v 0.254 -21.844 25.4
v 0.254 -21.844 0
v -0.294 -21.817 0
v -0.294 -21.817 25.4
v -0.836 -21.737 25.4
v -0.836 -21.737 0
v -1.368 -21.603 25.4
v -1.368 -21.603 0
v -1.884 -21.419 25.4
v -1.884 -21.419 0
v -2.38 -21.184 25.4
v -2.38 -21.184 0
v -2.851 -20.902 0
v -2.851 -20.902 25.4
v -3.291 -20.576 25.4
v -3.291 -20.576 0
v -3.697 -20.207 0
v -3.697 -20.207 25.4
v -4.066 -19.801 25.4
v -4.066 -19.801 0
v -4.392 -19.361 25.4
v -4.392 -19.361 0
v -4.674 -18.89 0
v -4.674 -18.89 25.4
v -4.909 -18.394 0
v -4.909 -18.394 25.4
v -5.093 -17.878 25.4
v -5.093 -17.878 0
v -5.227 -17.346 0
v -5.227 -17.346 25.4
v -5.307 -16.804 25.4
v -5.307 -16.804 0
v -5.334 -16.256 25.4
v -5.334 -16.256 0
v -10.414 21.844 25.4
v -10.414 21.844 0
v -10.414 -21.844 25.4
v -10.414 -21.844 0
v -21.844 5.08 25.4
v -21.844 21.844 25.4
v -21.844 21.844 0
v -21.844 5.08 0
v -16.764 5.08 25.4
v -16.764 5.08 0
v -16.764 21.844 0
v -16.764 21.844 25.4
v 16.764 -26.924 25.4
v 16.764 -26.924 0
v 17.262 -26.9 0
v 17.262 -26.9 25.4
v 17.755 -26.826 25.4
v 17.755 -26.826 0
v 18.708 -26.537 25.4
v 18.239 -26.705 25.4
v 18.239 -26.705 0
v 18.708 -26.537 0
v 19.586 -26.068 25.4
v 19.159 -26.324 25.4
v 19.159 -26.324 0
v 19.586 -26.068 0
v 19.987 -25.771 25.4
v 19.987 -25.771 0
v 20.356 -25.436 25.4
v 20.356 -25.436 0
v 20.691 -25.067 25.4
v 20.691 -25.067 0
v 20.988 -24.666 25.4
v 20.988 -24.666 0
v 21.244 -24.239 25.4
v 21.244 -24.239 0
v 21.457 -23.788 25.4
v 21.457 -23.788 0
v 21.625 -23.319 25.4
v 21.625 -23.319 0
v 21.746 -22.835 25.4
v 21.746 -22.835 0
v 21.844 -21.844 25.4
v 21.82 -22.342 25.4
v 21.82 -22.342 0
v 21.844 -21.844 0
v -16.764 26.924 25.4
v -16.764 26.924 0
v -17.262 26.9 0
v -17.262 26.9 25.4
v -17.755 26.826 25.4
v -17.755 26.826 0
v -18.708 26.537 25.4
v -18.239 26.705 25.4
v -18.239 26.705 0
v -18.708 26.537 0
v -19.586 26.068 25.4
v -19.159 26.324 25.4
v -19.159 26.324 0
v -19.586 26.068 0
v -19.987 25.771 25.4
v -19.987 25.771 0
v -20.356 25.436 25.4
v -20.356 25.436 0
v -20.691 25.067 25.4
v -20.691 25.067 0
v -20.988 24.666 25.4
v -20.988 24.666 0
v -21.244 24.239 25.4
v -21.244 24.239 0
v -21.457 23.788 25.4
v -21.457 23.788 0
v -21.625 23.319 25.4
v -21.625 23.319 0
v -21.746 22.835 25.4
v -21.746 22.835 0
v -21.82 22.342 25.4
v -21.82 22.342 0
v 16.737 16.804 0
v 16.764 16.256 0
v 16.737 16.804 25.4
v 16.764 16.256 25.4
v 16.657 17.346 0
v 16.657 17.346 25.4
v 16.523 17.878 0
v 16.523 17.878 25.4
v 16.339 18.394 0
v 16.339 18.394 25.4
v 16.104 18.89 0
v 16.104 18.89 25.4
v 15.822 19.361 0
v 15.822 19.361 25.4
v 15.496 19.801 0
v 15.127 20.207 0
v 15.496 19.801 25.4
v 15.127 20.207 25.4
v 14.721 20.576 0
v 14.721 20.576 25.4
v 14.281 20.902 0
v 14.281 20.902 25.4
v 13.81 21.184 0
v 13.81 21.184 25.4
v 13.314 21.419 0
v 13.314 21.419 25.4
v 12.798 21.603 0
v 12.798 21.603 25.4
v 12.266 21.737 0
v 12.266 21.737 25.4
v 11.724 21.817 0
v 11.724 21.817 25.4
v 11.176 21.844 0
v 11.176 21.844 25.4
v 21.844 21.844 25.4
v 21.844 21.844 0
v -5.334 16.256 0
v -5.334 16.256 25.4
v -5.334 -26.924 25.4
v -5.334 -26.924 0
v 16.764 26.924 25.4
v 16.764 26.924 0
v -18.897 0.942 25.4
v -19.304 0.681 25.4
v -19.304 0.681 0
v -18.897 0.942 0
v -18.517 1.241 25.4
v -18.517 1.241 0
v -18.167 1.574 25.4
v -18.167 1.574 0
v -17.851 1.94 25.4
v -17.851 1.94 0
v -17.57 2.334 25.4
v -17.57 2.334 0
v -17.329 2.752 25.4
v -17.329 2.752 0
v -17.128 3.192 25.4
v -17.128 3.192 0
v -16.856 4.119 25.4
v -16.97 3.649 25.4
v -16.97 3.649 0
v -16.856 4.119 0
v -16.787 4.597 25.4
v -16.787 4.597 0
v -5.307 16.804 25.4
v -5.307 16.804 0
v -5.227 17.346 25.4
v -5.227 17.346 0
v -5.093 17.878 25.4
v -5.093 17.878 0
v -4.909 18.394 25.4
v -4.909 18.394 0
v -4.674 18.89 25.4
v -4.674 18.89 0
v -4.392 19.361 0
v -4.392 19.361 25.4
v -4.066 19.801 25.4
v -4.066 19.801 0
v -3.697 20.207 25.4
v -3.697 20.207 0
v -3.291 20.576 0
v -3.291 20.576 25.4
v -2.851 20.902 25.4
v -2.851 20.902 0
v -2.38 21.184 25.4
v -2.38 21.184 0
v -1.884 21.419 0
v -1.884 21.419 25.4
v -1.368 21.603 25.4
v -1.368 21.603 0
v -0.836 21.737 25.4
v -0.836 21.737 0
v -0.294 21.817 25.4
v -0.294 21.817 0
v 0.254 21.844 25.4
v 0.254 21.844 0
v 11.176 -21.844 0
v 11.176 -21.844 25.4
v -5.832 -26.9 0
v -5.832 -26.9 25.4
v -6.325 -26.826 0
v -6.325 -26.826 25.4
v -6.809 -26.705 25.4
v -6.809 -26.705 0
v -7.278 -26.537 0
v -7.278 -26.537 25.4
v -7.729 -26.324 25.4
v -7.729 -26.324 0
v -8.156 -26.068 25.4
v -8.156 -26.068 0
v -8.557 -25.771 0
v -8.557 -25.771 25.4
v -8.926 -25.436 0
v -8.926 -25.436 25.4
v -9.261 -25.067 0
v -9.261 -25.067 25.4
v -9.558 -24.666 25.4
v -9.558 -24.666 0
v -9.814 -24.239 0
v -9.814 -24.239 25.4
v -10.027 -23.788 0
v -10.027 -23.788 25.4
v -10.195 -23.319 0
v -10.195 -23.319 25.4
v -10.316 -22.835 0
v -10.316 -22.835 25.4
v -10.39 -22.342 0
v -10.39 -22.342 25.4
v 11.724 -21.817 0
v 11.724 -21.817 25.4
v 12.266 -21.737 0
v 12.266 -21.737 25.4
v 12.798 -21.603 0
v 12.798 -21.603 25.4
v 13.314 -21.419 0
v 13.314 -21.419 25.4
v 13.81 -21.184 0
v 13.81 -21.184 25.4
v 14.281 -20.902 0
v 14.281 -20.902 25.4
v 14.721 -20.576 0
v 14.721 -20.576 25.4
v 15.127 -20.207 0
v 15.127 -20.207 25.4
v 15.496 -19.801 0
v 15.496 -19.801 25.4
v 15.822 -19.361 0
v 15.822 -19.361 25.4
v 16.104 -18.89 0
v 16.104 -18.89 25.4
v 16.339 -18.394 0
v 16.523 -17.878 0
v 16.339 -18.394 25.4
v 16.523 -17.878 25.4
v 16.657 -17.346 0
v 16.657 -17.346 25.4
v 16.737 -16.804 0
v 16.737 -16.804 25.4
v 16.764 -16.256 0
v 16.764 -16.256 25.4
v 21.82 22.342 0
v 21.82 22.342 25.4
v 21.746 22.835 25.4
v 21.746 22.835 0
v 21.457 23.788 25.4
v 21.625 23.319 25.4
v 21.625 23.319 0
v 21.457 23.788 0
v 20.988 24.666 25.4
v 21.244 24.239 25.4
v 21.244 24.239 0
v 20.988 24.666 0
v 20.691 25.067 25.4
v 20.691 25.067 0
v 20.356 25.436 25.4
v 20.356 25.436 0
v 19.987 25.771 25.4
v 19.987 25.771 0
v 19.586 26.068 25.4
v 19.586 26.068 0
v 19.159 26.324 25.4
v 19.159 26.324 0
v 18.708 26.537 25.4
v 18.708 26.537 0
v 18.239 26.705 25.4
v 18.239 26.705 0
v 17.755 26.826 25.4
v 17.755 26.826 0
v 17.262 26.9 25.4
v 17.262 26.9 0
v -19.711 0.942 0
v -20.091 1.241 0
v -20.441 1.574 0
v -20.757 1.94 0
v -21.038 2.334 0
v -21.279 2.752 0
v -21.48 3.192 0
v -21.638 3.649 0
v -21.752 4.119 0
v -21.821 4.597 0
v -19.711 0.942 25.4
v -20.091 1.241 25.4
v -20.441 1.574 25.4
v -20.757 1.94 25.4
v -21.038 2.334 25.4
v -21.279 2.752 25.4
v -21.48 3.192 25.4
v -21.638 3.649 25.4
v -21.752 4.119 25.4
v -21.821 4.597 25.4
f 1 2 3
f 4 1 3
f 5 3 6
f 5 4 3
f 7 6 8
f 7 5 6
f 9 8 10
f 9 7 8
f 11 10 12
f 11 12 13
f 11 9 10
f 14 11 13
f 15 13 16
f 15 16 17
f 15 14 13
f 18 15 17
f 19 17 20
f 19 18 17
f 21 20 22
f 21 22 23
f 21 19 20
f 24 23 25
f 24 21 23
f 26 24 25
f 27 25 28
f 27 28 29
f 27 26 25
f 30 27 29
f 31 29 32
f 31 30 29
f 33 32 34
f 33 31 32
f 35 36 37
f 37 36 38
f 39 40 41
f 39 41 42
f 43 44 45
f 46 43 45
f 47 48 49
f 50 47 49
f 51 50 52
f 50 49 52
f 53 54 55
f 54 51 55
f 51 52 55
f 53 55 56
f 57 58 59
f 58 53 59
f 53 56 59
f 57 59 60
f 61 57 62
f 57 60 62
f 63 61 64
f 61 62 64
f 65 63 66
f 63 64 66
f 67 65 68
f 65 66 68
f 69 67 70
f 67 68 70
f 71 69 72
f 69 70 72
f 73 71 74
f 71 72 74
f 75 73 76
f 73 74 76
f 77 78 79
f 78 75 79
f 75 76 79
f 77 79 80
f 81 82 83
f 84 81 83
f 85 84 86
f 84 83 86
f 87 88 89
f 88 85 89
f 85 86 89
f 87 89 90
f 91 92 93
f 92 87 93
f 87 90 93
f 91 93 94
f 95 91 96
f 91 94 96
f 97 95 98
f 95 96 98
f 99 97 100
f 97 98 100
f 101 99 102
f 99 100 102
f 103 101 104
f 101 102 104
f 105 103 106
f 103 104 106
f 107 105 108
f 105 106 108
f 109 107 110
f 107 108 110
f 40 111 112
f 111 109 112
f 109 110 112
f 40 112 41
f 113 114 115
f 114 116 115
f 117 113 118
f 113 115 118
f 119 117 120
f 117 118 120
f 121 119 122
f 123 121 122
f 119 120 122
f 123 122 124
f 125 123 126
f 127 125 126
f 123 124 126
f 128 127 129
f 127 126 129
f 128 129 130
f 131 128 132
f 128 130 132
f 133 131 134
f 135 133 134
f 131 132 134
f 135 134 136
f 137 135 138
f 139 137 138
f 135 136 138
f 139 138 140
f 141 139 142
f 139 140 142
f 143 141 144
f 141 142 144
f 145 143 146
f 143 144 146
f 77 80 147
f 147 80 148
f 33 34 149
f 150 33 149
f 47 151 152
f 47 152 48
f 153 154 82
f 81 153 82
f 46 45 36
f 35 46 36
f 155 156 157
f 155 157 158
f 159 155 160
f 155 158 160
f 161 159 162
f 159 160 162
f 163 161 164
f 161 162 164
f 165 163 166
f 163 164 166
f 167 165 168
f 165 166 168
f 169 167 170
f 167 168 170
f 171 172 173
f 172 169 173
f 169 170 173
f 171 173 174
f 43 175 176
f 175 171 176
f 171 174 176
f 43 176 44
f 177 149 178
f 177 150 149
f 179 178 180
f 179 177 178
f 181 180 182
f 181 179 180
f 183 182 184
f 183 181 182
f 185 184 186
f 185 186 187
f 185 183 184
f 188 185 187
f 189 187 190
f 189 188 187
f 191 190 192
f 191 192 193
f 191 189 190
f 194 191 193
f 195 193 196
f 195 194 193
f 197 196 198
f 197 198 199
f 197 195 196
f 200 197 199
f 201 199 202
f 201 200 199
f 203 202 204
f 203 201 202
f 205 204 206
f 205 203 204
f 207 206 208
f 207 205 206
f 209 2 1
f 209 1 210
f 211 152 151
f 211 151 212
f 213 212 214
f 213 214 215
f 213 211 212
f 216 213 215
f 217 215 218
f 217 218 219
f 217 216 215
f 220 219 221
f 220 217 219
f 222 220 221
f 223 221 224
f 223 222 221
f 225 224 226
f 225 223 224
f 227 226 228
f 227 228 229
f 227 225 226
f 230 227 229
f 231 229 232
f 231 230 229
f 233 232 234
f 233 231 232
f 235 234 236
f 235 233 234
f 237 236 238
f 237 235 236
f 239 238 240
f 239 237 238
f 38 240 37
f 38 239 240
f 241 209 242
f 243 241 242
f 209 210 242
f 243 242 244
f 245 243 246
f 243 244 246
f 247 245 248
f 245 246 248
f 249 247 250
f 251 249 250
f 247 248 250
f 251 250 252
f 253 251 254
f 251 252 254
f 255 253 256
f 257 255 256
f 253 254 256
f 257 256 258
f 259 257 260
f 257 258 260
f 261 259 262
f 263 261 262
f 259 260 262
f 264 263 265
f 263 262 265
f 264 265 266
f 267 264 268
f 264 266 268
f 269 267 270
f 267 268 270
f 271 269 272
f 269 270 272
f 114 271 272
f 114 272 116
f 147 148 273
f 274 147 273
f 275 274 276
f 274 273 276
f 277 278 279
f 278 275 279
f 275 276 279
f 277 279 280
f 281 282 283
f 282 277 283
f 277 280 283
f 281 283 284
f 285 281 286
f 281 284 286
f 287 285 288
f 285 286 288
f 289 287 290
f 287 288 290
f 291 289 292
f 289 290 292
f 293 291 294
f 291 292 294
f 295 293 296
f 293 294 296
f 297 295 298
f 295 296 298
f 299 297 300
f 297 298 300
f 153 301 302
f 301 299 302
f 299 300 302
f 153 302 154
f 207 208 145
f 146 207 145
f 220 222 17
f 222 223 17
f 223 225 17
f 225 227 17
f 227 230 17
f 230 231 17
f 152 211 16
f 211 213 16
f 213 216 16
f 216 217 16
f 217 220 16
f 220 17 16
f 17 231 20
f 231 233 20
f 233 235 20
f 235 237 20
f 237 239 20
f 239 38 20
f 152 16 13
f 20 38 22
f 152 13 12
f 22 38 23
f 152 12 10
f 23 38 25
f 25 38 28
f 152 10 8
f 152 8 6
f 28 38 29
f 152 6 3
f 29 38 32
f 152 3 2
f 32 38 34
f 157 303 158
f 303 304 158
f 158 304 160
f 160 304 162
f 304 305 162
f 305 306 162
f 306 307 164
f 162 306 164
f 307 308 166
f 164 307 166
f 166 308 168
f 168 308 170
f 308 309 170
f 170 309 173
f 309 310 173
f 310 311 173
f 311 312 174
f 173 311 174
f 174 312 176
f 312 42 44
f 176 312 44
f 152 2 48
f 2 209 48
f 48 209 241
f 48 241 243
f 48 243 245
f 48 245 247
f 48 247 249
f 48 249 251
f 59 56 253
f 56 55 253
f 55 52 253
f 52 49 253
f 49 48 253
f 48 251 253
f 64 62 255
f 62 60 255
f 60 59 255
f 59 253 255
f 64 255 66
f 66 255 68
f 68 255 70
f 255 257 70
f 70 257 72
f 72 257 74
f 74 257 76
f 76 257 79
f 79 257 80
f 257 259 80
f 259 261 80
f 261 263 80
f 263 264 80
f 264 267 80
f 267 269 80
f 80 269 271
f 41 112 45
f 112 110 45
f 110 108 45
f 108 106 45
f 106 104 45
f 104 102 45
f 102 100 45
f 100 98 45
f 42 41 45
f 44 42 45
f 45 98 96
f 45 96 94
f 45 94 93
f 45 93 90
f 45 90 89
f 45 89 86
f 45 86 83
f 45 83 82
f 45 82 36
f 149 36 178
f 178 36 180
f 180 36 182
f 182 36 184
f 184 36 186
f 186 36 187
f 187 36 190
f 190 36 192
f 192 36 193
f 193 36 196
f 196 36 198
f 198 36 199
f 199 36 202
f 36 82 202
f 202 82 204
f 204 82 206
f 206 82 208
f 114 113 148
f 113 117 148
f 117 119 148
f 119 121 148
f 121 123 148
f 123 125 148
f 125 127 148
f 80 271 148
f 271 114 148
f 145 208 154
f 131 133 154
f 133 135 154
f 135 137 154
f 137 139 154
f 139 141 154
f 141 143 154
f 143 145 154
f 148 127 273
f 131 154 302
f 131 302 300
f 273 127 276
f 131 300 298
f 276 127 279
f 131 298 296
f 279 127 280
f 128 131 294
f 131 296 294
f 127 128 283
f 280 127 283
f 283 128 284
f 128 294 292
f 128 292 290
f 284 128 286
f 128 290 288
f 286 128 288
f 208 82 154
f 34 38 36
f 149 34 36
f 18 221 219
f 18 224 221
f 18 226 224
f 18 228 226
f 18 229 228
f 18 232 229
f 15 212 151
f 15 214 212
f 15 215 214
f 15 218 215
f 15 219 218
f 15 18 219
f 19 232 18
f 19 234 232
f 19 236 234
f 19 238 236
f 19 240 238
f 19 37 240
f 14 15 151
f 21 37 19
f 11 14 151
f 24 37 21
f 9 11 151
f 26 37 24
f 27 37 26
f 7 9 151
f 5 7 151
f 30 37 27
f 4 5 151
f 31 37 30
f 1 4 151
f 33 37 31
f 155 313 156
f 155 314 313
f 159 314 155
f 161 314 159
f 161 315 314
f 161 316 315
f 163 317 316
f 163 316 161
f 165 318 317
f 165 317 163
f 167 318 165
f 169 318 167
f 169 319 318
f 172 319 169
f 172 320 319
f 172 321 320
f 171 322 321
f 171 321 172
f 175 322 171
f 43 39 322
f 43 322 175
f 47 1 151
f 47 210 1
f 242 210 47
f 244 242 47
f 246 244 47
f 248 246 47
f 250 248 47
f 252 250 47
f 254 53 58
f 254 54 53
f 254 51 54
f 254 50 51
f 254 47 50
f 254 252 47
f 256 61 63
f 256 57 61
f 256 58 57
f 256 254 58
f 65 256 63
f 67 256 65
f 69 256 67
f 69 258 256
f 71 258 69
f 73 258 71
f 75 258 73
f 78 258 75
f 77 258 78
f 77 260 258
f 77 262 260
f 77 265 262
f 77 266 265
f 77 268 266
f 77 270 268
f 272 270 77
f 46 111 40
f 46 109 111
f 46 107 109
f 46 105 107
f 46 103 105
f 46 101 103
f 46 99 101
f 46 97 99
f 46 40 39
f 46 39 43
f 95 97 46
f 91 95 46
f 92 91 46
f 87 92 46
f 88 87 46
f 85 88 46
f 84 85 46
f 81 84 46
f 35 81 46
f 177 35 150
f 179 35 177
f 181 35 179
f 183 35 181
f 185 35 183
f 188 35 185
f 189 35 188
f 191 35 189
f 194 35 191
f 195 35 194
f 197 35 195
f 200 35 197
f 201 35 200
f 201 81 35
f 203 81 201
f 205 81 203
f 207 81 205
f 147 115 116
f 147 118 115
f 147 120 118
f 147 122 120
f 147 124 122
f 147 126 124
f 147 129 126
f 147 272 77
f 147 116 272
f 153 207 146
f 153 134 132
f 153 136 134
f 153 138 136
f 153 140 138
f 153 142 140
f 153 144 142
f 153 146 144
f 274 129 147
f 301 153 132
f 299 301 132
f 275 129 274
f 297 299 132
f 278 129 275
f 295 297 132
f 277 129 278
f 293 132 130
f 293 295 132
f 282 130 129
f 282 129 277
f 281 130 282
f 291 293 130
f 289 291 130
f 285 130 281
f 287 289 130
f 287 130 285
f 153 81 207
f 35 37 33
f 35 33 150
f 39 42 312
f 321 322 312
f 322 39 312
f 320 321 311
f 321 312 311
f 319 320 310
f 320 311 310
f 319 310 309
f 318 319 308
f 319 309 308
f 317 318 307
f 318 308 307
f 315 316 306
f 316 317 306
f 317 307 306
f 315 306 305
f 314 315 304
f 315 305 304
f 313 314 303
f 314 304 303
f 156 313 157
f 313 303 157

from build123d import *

# Parameters (mm, degrees)
F0_W        = 22.098
F0_H        = 43.688
F1_DEPTH    = 25.4
F2_T1_DEPTH = 50.8
F3_R        = 5.588


# Not quite as in the source:
# - a fillet or chamfer that OpenCascade refuses, or shapes differently, is made with other operations: its cross-section is extruded or revolved along the edge and cut away or added


with BuildPart() as f1:
    # F0 (on Top) → F1 (new body)
    with BuildSketch(Plane.XY):
        Polygon((21.844, -26.924), (21.844, 26.924), (-21.844, 26.924), (-21.844, 0), (-16.764, 0), (-16.764, 21.844), (-10.414, 21.844), (-10.414, -26.924), align=None)
        with Locations((5.715, 0)):
            Rectangle(F0_W, F0_H, mode=Mode.SUBTRACT)
    extrude(amount=F1_DEPTH)

    # F2: fillet of radius 5.08 on 6 edges, made by hand

    # F2_s2 → F2_t1 (cut)
    with BuildSketch(Plane.XY.offset(-12.7)):
        with BuildLine():
            ThreePointArc((-16.764, 26.924), (-20.3561024484, 25.4361024484), (-21.844, 21.844))
            Line((-21.844, 21.844), (-21.844, 26.924))
            Line((-21.844, 26.924), (-16.764, 26.924))
        make_face()
        with BuildLine():
            ThreePointArc((21.844, 21.844), (20.3561024484, 25.4361024484), (16.764, 26.924))
            Line((16.764, 26.924), (21.844, 26.924))
            Line((21.844, 26.924), (21.844, 21.844))
        make_face()
        with BuildLine():
            ThreePointArc((-5.334, -26.924), (-8.9261024484, -25.4361024484), (-10.414, -21.844))
            Line((-10.414, -21.844), (-10.414, -26.924))
            Line((-10.414, -26.924), (-5.334, -26.924))
        make_face()
        with BuildLine():
            ThreePointArc((16.764, -26.924), (20.3561024484, -25.4361024484), (21.844, -21.844))
            Line((21.844, -21.844), (21.844, -26.924))
            Line((21.844, -26.924), (16.764, -26.924))
        make_face()
        with BuildLine():
            ThreePointArc((-21.844, 0), (-18.2518975516, 1.4878975516), (-16.764, 5.08))
            Line((-16.764, 5.08), (-16.764, 0))
            Line((-16.764, 0), (-21.844, 0))
        make_face()
        with BuildLine():
            ThreePointArc((-21.844, 5.08), (-20.3561024484, 1.4878975516), (-16.764, 0))
            Line((-16.764, 0), (-21.844, 0))
            Line((-21.844, 0), (-21.844, 5.08))
        make_face()
    extrude(amount=F2_T1_DEPTH, mode=Mode.SUBTRACT)

    # F3
    f3_edges = [f1.edges().sort_by_distance(p)[0] for p in [
        (-5.334, -21.844, 12.7),
        (16.764, -21.844, 12.7),
        (16.764, 21.844, 12.7),
        (-5.334, 21.844, 12.7),
    ]]
    fillet(f3_edges, radius=F3_R)


solid = f1.part
